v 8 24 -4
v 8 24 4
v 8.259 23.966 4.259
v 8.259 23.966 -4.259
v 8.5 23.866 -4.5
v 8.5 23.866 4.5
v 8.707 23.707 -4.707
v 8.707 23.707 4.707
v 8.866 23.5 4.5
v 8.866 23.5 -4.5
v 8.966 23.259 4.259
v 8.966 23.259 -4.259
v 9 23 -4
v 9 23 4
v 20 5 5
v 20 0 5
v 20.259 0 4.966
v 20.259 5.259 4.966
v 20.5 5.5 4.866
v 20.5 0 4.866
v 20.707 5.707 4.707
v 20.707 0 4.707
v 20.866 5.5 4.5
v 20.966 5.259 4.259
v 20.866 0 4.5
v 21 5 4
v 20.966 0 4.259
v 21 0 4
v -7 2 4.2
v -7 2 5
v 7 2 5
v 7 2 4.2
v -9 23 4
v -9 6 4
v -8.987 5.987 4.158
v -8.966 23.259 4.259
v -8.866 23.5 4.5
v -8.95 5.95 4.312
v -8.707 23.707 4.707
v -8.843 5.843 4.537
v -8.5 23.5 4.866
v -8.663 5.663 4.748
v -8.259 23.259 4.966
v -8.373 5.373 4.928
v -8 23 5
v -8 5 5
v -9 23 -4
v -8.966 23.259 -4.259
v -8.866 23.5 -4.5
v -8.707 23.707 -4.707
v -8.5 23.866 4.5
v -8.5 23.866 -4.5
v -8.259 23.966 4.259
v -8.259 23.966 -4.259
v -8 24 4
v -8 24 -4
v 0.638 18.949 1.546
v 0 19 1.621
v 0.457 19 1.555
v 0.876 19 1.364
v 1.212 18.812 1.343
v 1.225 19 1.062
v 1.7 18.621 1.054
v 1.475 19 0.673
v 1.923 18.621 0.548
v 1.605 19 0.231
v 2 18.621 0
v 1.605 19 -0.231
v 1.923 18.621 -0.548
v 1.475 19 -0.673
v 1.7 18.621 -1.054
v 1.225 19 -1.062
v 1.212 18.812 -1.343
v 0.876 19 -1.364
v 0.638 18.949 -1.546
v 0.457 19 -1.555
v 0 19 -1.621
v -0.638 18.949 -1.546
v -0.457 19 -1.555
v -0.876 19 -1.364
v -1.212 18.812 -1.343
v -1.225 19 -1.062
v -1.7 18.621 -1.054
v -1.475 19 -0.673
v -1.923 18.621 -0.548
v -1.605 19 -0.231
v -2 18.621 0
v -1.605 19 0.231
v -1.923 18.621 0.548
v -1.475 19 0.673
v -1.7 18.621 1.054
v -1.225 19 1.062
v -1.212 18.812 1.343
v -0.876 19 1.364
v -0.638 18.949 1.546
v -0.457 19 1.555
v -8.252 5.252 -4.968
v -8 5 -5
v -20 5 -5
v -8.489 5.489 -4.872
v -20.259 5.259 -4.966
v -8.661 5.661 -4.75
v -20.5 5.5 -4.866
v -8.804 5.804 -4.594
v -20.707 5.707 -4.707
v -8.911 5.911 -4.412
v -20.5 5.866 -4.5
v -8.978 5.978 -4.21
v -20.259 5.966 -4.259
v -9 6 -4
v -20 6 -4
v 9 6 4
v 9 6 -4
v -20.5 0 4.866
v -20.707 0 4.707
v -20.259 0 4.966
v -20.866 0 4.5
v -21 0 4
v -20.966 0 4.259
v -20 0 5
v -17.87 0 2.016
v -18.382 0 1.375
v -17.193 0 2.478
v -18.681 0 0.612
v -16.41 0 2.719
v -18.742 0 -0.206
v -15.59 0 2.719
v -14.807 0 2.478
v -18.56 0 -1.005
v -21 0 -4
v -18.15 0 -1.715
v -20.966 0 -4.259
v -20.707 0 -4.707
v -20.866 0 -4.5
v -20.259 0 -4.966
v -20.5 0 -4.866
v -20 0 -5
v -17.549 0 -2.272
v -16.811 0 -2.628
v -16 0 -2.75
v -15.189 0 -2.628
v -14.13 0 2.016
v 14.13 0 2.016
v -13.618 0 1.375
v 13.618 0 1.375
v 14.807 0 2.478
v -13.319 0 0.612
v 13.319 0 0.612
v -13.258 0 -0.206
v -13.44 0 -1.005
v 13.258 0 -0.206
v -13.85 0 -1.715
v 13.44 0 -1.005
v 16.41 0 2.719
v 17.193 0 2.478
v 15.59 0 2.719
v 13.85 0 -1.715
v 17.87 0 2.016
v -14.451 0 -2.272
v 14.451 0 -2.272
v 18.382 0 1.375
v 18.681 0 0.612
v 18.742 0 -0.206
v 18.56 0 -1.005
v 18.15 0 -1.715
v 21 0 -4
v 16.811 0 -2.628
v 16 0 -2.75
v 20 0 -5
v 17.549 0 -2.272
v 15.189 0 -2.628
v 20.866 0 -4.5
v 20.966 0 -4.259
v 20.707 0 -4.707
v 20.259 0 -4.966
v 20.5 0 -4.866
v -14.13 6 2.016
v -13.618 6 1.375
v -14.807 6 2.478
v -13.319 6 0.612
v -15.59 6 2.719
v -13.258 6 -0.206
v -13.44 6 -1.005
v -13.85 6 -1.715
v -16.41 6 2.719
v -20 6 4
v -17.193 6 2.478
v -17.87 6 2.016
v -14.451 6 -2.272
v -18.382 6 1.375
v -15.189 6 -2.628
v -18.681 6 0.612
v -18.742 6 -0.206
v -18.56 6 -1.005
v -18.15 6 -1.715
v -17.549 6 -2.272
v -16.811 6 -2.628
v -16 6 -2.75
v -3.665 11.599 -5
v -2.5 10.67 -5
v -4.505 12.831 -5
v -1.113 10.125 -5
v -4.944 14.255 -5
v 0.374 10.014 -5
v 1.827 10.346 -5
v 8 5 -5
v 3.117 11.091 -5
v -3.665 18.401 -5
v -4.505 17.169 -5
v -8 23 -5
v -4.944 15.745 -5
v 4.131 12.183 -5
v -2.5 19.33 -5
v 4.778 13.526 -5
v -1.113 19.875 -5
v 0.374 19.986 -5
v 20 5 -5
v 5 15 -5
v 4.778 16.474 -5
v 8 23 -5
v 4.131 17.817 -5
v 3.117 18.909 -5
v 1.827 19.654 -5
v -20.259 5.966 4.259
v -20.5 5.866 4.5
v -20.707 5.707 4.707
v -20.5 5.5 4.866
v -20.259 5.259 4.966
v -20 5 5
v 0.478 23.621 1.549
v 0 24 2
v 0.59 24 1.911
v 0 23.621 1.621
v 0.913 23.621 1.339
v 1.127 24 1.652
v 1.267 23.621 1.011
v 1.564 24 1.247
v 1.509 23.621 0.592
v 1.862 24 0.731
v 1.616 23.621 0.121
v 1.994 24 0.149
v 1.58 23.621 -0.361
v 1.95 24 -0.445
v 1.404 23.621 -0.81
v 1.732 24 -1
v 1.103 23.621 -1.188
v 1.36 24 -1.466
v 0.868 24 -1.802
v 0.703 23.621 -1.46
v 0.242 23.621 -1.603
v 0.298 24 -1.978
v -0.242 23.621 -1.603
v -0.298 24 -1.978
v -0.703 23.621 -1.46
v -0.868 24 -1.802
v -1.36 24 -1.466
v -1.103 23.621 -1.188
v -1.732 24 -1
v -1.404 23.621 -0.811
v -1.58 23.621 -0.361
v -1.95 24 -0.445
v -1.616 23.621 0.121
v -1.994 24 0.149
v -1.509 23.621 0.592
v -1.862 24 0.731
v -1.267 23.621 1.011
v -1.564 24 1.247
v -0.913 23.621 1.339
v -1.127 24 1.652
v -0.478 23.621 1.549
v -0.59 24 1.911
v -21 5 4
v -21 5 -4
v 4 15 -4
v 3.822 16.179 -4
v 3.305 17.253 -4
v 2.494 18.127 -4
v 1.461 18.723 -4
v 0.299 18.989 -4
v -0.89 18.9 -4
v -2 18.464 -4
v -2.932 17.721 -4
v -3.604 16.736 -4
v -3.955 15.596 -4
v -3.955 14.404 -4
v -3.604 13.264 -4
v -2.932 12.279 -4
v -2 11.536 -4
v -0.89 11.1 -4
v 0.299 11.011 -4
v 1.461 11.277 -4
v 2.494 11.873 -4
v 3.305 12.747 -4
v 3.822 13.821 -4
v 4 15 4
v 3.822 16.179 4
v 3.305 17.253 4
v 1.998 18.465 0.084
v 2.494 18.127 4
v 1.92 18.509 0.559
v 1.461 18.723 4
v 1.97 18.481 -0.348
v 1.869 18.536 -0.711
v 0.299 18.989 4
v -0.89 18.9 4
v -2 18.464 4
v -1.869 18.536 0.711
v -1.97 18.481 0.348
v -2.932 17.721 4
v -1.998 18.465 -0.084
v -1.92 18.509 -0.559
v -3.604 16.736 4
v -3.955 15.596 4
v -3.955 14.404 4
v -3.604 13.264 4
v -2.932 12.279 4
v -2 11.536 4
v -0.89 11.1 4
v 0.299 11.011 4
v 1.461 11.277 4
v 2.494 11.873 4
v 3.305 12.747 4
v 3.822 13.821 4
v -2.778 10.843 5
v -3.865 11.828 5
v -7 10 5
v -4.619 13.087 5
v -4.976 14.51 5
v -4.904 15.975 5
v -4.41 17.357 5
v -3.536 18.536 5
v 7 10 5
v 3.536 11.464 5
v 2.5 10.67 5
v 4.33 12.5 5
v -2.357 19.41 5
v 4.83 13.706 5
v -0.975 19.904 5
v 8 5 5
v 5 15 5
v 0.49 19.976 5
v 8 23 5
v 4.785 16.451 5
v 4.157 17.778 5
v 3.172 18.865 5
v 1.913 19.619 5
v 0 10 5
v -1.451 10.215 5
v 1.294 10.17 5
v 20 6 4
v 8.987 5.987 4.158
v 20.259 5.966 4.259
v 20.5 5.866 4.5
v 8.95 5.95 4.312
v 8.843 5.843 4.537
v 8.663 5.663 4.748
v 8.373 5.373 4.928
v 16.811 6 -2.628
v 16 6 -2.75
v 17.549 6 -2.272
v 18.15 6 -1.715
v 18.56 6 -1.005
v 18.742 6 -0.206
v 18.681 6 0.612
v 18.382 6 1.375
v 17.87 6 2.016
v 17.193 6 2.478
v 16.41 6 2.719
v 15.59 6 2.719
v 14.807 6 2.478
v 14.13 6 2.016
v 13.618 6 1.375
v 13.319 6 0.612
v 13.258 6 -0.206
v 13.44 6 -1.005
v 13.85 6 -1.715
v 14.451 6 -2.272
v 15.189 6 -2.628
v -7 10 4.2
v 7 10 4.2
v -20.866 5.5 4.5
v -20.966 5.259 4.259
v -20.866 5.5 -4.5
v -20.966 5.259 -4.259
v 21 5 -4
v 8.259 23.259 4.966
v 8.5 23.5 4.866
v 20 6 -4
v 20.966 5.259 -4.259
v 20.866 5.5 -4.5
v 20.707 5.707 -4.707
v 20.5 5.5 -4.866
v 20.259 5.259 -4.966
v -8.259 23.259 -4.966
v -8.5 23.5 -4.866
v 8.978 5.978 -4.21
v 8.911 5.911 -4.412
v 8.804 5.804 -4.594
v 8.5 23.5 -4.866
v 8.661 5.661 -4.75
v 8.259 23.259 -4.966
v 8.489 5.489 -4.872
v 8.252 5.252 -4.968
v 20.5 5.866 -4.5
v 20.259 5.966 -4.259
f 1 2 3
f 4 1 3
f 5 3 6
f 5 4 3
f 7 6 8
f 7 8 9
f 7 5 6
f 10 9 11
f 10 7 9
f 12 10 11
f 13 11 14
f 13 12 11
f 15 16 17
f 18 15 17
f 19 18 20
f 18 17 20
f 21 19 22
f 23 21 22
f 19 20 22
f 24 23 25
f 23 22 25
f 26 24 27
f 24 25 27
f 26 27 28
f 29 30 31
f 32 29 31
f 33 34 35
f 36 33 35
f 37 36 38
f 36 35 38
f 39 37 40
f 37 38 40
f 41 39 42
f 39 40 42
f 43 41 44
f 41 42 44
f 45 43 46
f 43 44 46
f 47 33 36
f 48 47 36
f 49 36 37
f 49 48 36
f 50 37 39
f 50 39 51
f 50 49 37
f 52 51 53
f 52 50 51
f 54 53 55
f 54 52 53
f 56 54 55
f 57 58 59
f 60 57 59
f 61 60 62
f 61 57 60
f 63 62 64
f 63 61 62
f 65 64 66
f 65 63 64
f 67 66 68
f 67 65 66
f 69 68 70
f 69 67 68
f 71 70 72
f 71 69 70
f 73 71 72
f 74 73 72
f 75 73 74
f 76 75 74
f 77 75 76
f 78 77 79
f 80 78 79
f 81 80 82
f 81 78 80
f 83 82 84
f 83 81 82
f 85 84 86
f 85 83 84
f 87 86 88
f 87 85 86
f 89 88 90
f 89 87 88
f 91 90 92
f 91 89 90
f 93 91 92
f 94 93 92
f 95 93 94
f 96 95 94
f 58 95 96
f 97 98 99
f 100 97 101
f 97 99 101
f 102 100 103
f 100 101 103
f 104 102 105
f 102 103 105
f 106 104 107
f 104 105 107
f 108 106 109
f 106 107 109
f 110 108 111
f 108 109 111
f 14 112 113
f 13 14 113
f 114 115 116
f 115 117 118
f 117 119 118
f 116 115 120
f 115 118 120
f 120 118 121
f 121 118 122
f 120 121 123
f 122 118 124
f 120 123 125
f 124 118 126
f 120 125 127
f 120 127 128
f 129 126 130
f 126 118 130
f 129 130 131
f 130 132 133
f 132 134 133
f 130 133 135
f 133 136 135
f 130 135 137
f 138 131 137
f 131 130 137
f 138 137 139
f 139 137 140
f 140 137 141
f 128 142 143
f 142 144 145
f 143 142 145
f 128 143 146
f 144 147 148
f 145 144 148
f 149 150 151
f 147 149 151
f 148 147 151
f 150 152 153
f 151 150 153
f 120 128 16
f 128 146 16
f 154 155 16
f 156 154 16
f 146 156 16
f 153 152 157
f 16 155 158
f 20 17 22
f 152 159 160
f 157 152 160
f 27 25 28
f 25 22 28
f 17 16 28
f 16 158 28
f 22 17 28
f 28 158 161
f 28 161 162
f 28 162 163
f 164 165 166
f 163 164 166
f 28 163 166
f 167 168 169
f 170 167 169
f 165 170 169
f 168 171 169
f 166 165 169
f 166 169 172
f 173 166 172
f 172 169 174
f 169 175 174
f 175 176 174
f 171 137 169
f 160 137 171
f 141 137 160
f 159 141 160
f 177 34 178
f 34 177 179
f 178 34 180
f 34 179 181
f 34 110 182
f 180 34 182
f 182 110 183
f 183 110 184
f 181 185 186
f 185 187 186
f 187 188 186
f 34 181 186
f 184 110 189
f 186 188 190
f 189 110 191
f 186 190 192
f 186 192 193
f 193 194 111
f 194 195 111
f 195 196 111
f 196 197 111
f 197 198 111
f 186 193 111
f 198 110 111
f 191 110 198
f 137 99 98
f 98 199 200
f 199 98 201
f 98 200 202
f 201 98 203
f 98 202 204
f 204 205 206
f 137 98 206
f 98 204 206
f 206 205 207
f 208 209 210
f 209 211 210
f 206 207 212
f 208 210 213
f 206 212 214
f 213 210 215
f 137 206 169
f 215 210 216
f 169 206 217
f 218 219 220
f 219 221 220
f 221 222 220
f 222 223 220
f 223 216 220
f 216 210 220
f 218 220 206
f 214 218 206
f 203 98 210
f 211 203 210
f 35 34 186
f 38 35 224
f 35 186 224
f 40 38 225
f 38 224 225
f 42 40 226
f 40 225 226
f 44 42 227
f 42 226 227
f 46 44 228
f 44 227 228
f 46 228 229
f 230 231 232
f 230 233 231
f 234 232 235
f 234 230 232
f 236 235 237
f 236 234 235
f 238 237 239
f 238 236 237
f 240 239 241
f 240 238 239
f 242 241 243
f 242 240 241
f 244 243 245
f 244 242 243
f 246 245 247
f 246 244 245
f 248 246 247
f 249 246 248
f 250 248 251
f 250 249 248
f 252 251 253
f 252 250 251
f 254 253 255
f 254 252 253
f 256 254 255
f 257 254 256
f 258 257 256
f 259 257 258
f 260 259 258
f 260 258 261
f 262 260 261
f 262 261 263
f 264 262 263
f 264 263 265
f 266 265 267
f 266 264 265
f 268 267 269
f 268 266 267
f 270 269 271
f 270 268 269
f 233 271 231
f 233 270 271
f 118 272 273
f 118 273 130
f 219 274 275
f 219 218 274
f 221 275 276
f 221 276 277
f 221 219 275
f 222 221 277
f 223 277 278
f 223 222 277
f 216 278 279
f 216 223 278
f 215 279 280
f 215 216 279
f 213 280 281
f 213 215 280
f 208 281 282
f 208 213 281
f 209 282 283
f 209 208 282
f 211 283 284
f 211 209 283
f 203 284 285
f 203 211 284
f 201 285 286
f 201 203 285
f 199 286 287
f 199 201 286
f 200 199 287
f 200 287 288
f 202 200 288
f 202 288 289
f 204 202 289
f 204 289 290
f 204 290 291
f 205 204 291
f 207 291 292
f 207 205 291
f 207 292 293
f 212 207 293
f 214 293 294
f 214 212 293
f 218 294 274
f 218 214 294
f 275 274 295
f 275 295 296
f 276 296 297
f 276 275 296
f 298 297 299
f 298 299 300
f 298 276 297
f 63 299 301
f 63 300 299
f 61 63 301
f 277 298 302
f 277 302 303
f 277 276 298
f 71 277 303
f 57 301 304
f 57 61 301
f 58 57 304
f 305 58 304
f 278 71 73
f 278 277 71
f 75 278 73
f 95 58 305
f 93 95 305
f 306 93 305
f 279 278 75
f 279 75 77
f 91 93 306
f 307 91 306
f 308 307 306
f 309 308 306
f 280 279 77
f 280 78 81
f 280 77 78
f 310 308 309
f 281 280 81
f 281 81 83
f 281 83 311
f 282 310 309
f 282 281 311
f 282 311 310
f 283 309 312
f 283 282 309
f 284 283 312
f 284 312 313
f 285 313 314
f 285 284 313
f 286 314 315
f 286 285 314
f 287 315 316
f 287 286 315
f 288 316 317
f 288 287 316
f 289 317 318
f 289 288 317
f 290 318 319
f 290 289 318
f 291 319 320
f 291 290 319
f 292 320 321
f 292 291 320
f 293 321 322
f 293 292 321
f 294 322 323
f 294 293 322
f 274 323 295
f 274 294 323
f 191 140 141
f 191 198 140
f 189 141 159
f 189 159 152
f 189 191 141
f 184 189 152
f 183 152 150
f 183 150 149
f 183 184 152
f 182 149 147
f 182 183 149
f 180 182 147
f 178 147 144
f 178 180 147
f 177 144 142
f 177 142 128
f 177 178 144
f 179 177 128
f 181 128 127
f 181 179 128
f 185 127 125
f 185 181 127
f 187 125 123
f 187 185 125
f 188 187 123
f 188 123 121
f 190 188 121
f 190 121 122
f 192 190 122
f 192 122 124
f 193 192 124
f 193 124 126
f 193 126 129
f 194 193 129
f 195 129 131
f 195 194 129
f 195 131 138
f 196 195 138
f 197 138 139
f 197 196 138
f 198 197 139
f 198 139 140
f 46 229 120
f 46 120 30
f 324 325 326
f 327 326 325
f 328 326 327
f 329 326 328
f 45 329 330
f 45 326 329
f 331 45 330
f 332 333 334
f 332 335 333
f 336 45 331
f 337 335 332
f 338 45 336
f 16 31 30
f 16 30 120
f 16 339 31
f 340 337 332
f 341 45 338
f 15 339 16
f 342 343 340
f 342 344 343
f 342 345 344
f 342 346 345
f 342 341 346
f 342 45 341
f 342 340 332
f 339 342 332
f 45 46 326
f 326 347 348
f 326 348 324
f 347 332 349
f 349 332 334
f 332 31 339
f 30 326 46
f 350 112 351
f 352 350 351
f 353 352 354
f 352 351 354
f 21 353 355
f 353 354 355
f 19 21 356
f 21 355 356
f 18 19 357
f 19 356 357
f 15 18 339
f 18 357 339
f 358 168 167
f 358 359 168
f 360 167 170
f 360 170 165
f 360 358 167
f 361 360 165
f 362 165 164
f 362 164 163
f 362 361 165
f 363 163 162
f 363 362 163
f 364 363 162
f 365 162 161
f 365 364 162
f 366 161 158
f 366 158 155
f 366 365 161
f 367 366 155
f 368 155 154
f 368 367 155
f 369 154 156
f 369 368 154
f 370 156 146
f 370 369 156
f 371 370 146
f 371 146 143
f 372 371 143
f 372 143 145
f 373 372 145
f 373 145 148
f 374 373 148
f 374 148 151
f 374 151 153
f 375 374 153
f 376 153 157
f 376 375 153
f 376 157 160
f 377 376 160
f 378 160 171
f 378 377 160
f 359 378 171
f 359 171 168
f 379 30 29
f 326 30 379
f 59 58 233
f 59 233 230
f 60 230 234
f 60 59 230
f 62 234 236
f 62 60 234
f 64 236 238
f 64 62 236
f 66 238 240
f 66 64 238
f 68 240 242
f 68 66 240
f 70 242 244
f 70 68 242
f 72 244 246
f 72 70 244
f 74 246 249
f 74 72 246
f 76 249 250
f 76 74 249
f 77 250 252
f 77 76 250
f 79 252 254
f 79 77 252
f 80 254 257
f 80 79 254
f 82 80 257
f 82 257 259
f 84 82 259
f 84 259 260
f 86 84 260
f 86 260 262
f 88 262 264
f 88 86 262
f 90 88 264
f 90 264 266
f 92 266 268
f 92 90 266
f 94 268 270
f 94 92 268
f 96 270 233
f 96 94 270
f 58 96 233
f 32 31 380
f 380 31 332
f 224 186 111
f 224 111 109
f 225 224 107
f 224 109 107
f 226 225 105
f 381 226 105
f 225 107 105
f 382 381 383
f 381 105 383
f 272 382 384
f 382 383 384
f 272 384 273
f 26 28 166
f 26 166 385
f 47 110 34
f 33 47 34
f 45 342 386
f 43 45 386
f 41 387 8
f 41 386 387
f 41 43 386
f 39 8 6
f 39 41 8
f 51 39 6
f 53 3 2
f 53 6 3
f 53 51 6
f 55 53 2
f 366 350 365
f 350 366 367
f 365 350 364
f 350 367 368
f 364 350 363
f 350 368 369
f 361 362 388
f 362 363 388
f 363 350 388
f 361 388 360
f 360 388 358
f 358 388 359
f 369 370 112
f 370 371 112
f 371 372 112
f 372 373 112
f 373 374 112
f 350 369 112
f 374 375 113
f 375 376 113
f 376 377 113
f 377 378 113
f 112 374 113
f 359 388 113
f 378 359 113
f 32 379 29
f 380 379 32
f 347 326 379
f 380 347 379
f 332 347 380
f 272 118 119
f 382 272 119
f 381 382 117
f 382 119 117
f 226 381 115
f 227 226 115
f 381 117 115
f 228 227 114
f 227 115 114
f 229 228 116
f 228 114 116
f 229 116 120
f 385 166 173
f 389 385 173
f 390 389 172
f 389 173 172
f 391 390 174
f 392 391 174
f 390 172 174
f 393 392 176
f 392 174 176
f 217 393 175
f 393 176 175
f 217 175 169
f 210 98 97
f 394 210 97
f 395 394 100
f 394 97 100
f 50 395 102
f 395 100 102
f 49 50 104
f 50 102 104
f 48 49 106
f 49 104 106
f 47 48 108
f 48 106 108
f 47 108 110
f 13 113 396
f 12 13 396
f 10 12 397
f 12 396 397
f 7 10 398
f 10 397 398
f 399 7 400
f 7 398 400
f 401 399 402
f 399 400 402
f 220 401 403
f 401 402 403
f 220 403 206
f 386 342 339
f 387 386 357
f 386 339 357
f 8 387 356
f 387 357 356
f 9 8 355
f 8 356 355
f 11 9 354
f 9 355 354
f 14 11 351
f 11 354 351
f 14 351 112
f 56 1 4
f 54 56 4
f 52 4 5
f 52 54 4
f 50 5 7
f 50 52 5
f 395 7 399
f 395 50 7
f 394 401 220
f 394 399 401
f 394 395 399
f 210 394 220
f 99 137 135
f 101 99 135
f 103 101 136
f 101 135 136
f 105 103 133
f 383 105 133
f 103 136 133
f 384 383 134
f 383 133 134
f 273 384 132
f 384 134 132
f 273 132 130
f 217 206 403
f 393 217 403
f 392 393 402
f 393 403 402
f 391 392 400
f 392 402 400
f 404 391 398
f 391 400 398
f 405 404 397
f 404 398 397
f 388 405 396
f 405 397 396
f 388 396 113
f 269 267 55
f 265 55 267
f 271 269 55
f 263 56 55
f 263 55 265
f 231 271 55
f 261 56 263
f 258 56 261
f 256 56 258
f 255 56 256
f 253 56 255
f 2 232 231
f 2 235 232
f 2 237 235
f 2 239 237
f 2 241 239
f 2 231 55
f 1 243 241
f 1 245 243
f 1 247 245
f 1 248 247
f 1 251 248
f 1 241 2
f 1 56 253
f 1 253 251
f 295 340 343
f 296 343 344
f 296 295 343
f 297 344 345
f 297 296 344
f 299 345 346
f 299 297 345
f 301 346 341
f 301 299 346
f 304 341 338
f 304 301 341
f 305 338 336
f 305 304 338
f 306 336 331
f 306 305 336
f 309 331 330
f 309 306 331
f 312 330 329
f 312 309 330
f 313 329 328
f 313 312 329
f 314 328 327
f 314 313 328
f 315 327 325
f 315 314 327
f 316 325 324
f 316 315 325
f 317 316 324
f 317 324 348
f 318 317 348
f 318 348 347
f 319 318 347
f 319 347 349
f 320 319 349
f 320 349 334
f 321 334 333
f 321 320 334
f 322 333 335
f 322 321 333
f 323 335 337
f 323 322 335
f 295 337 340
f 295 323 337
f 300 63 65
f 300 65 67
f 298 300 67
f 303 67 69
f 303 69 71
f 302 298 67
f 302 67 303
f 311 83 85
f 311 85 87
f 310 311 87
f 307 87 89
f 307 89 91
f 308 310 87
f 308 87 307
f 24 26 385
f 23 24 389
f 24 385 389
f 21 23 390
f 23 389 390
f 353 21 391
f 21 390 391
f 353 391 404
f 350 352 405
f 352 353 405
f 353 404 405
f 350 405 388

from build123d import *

# Parameters (mm, degrees)
BOSS_EXTRUDE1_DEPTH      = 5
BOSS_EXTRUDE1_DEPTH_BACK = 5
CUT_EXTRUDE1_DEPTH       = 42
CUT_EXTRUDE1_DEPTH_BACK  = 42
SKETCH2_W                = 20
SKETCH2_H                = 16
CUT_EXTRUDE2_DEPTH       = 42
CUT_EXTRUDE2_DEPTH_BACK  = 42
SKETCH3_W                = 63
SKETCH3_H                = 20
BOSS_EXTRUDE2_DEPTH      = 24
CUT_EXTRUDE3_DEPTH       = 10
CUT_EXTRUDE3_DEPTH_BACK  = 10
CUT_EXTRUDE4_DEPTH       = 18
CUT_EXTRUDE4_DEPTH_BACK  = 18
SKETCH8_W                = 2.75
SKETCH8_H                = 6
SKETCH9_W                = 2.75
SKETCH9_H                = 6
SKETCH11_W               = 14
SKETCH11_H               = 8
CUT_EXTRUDE5_DEPTH       = 0.8


with BuildPart() as part:
    # Sketch1 → Boss-Extrude1 (new, two sides: drawn at the far end of the back side and taken through both)
    with BuildSketch(Plane.XY.offset(-BOSS_EXTRUDE1_DEPTH_BACK)):
        with BuildLine():
            Line((-21, 0), (21, 0))
            Line((21, 0), (21, 5))
            ThreePointArc((21, 5), (20.707106781, 5.707106781), (20, 6))
            Line((20, 6), (-20, 6))
            ThreePointArc((-20, 6), (-20.707106781, 5.707106781), (-21, 5))
            Line((-21, 5), (-21, 0))
        make_face()
    extrude(amount=BOSS_EXTRUDE1_DEPTH + BOSS_EXTRUDE1_DEPTH_BACK)

    # Sketch2 → Cut-Extrude1 (cut, two sides: drawn at the far end of the back side and taken through both)
    with BuildSketch(Plane(origin=(0, 0, 0), x_dir=(0, 0, -1), z_dir=(1, 0, 0)).offset(-CUT_EXTRUDE1_DEPTH_BACK)):
        with Locations((0, 3)):
            Rectangle(SKETCH2_W, SKETCH2_H)
        with BuildLine():
            Line((-5, 0), (5, 0))
            Line((5, 0), (5, 5))
            ThreePointArc((5, 5), (4.707106781, 5.707106781), (4, 6))
            Line((4, 6), (-4, 6))
            ThreePointArc((-4, 6), (-4.707106781, 5.707106781), (-5, 5))
            Line((-5, 5), (-5, 0))
        make_face(mode=Mode.SUBTRACT)
    extrude(amount=CUT_EXTRUDE1_DEPTH + CUT_EXTRUDE1_DEPTH_BACK, mode=Mode.SUBTRACT)

    # Sketch3 → Cut-Extrude2 (cut, two sides: drawn at the far end of the back side and taken through both)
    with BuildSketch(Plane(origin=(0, 0, 0), x_dir=(1, 0, 0), z_dir=(0, 1, 0)).offset(-CUT_EXTRUDE2_DEPTH_BACK)):
        Rectangle(SKETCH3_W, SKETCH3_H)
        with BuildLine():
            Line((-21, 4), (-21, -4))
            ThreePointArc((-21, -4), (-20.707106781, -4.707106781), (-20, -5))
            Line((-20, -5), (20, -5))
            ThreePointArc((20, -5), (20.707106781, -4.707106781), (21, -4))
            Line((21, -4), (21, 4))
            ThreePointArc((21, 4), (20.707106781, 4.707106781), (20, 5))
            Line((20, 5), (-20, 5))
            ThreePointArc((-20, 5), (-20.707106781, 4.707106781), (-21, 4))
        make_face(mode=Mode.SUBTRACT)
    extrude(amount=CUT_EXTRUDE2_DEPTH + CUT_EXTRUDE2_DEPTH_BACK, mode=Mode.SUBTRACT)

    # Sketch4 → Boss-Extrude2 (add)
    with BuildSketch(Plane(origin=(0, 0, 0), x_dir=(1, 0, 0), z_dir=(0, 1, 0))):
        with BuildLine():
            Line((-9, 4), (-9, -4))
            ThreePointArc((-9, -4), (-8.707106781, -4.707106781), (-8, -5))
            Line((-8, -5), (8, -5))
            ThreePointArc((8, -5), (8.707106781, -4.707106781), (9, -4))
            Line((9, -4), (9, 4))
            ThreePointArc((9, 4), (8.707106781, 4.707106781), (8, 5))
            Line((8, 5), (-8, 5))
            ThreePointArc((-8, 5), (-8.707106781, 4.707106781), (-9, 4))
        make_face()
    extrude(amount=BOSS_EXTRUDE2_DEPTH)

    # Sketch5 → Cut-Extrude3 (cut, two sides: drawn at the far end of the back side and taken through both)
    with BuildSketch(Plane.XY.offset(-CUT_EXTRUDE3_DEPTH_BACK)):
        with BuildLine():
            Line((-9, 48), (-9, 23))
            ThreePointArc((-9, 23), (-8.707106781, 23.707106781), (-8, 24))
            Line((-8, 24), (8, 24))
            ThreePointArc((8, 24), (8.707106781, 23.707106781), (9, 23))
            Line((9, 23), (9, 48))
            Line((9, 48), (-9, 48))
        make_face()
    extrude(amount=CUT_EXTRUDE3_DEPTH + CUT_EXTRUDE3_DEPTH_BACK, mode=Mode.SUBTRACT)

    # Sketch6 → Cut-Extrude4 (cut, two sides: drawn at the far end of the back side and taken through both)
    with BuildSketch(Plane(origin=(0, 0, 0), x_dir=(0, 0, -1), z_dir=(1, 0, 0)).offset(-CUT_EXTRUDE4_DEPTH_BACK)):
        with BuildLine():
            Line((-5, 48), (-5, 23))
            ThreePointArc((-5, 23), (-4.707106781, 23.707106781), (-4, 24))
            Line((-4, 24), (4, 24))
            ThreePointArc((4, 24), (4.707106781, 23.707106781), (5, 23))
            Line((5, 23), (5, 48))
            Line((5, 48), (-5, 48))
        make_face()
    extrude(amount=CUT_EXTRUDE4_DEPTH + CUT_EXTRUDE4_DEPTH_BACK, mode=Mode.SUBTRACT)

    # Sketch7 → Cut-Revolve1 (revolve, cut)
    with BuildSketch(Plane(origin=(0, 0, 0), x_dir=(0, 0, -1), z_dir=(1, 0, 0))):
        Polygon((-5, 15), (-5, 20), (-4, 19), (4, 19), (5, 20), (5, 15), align=None)
    revolve(axis=Axis((0, 15, -5), (0, 0, 1)), mode=Mode.SUBTRACT)

    # Sketch8 → Cut-Revolve2 (revolve, cut)
    with BuildSketch(Plane.XY):
        with Locations((-17.375, 3)):
            Rectangle(SKETCH8_W, SKETCH8_H)
    revolve(axis=Axis((-16, 6, 0), (0, -1, 0)), mode=Mode.SUBTRACT)

    # Sketch9 → Cut-Revolve3 (revolve, cut)
    with BuildSketch(Plane.XY):
        with Locations((14.625, 3)):
            Rectangle(SKETCH9_W, SKETCH9_H)
    revolve(axis=Axis((16, 6, 0), (0, -1, 0)), mode=Mode.SUBTRACT)

    # Sketch10 → Cut-Revolve4 (revolve, cut)
    with BuildSketch(Plane.XY):
        Polygon((0, 24), (2, 24), (1.621, 23.621), (1.621, 19), (2, 18.621), (2, 15), (0, 15), align=None)
    revolve(axis=Axis((0, 15, 0), (0, 1, 0)), mode=Mode.SUBTRACT)

    # Sketch11 → Cut-Extrude5 (cut)
    with BuildSketch(Plane.XY.offset(5)):
        with Locations((0, 6)):
            Rectangle(SKETCH11_W, SKETCH11_H)
    extrude(amount=-CUT_EXTRUDE5_DEPTH, mode=Mode.SUBTRACT)


solid = part.part
